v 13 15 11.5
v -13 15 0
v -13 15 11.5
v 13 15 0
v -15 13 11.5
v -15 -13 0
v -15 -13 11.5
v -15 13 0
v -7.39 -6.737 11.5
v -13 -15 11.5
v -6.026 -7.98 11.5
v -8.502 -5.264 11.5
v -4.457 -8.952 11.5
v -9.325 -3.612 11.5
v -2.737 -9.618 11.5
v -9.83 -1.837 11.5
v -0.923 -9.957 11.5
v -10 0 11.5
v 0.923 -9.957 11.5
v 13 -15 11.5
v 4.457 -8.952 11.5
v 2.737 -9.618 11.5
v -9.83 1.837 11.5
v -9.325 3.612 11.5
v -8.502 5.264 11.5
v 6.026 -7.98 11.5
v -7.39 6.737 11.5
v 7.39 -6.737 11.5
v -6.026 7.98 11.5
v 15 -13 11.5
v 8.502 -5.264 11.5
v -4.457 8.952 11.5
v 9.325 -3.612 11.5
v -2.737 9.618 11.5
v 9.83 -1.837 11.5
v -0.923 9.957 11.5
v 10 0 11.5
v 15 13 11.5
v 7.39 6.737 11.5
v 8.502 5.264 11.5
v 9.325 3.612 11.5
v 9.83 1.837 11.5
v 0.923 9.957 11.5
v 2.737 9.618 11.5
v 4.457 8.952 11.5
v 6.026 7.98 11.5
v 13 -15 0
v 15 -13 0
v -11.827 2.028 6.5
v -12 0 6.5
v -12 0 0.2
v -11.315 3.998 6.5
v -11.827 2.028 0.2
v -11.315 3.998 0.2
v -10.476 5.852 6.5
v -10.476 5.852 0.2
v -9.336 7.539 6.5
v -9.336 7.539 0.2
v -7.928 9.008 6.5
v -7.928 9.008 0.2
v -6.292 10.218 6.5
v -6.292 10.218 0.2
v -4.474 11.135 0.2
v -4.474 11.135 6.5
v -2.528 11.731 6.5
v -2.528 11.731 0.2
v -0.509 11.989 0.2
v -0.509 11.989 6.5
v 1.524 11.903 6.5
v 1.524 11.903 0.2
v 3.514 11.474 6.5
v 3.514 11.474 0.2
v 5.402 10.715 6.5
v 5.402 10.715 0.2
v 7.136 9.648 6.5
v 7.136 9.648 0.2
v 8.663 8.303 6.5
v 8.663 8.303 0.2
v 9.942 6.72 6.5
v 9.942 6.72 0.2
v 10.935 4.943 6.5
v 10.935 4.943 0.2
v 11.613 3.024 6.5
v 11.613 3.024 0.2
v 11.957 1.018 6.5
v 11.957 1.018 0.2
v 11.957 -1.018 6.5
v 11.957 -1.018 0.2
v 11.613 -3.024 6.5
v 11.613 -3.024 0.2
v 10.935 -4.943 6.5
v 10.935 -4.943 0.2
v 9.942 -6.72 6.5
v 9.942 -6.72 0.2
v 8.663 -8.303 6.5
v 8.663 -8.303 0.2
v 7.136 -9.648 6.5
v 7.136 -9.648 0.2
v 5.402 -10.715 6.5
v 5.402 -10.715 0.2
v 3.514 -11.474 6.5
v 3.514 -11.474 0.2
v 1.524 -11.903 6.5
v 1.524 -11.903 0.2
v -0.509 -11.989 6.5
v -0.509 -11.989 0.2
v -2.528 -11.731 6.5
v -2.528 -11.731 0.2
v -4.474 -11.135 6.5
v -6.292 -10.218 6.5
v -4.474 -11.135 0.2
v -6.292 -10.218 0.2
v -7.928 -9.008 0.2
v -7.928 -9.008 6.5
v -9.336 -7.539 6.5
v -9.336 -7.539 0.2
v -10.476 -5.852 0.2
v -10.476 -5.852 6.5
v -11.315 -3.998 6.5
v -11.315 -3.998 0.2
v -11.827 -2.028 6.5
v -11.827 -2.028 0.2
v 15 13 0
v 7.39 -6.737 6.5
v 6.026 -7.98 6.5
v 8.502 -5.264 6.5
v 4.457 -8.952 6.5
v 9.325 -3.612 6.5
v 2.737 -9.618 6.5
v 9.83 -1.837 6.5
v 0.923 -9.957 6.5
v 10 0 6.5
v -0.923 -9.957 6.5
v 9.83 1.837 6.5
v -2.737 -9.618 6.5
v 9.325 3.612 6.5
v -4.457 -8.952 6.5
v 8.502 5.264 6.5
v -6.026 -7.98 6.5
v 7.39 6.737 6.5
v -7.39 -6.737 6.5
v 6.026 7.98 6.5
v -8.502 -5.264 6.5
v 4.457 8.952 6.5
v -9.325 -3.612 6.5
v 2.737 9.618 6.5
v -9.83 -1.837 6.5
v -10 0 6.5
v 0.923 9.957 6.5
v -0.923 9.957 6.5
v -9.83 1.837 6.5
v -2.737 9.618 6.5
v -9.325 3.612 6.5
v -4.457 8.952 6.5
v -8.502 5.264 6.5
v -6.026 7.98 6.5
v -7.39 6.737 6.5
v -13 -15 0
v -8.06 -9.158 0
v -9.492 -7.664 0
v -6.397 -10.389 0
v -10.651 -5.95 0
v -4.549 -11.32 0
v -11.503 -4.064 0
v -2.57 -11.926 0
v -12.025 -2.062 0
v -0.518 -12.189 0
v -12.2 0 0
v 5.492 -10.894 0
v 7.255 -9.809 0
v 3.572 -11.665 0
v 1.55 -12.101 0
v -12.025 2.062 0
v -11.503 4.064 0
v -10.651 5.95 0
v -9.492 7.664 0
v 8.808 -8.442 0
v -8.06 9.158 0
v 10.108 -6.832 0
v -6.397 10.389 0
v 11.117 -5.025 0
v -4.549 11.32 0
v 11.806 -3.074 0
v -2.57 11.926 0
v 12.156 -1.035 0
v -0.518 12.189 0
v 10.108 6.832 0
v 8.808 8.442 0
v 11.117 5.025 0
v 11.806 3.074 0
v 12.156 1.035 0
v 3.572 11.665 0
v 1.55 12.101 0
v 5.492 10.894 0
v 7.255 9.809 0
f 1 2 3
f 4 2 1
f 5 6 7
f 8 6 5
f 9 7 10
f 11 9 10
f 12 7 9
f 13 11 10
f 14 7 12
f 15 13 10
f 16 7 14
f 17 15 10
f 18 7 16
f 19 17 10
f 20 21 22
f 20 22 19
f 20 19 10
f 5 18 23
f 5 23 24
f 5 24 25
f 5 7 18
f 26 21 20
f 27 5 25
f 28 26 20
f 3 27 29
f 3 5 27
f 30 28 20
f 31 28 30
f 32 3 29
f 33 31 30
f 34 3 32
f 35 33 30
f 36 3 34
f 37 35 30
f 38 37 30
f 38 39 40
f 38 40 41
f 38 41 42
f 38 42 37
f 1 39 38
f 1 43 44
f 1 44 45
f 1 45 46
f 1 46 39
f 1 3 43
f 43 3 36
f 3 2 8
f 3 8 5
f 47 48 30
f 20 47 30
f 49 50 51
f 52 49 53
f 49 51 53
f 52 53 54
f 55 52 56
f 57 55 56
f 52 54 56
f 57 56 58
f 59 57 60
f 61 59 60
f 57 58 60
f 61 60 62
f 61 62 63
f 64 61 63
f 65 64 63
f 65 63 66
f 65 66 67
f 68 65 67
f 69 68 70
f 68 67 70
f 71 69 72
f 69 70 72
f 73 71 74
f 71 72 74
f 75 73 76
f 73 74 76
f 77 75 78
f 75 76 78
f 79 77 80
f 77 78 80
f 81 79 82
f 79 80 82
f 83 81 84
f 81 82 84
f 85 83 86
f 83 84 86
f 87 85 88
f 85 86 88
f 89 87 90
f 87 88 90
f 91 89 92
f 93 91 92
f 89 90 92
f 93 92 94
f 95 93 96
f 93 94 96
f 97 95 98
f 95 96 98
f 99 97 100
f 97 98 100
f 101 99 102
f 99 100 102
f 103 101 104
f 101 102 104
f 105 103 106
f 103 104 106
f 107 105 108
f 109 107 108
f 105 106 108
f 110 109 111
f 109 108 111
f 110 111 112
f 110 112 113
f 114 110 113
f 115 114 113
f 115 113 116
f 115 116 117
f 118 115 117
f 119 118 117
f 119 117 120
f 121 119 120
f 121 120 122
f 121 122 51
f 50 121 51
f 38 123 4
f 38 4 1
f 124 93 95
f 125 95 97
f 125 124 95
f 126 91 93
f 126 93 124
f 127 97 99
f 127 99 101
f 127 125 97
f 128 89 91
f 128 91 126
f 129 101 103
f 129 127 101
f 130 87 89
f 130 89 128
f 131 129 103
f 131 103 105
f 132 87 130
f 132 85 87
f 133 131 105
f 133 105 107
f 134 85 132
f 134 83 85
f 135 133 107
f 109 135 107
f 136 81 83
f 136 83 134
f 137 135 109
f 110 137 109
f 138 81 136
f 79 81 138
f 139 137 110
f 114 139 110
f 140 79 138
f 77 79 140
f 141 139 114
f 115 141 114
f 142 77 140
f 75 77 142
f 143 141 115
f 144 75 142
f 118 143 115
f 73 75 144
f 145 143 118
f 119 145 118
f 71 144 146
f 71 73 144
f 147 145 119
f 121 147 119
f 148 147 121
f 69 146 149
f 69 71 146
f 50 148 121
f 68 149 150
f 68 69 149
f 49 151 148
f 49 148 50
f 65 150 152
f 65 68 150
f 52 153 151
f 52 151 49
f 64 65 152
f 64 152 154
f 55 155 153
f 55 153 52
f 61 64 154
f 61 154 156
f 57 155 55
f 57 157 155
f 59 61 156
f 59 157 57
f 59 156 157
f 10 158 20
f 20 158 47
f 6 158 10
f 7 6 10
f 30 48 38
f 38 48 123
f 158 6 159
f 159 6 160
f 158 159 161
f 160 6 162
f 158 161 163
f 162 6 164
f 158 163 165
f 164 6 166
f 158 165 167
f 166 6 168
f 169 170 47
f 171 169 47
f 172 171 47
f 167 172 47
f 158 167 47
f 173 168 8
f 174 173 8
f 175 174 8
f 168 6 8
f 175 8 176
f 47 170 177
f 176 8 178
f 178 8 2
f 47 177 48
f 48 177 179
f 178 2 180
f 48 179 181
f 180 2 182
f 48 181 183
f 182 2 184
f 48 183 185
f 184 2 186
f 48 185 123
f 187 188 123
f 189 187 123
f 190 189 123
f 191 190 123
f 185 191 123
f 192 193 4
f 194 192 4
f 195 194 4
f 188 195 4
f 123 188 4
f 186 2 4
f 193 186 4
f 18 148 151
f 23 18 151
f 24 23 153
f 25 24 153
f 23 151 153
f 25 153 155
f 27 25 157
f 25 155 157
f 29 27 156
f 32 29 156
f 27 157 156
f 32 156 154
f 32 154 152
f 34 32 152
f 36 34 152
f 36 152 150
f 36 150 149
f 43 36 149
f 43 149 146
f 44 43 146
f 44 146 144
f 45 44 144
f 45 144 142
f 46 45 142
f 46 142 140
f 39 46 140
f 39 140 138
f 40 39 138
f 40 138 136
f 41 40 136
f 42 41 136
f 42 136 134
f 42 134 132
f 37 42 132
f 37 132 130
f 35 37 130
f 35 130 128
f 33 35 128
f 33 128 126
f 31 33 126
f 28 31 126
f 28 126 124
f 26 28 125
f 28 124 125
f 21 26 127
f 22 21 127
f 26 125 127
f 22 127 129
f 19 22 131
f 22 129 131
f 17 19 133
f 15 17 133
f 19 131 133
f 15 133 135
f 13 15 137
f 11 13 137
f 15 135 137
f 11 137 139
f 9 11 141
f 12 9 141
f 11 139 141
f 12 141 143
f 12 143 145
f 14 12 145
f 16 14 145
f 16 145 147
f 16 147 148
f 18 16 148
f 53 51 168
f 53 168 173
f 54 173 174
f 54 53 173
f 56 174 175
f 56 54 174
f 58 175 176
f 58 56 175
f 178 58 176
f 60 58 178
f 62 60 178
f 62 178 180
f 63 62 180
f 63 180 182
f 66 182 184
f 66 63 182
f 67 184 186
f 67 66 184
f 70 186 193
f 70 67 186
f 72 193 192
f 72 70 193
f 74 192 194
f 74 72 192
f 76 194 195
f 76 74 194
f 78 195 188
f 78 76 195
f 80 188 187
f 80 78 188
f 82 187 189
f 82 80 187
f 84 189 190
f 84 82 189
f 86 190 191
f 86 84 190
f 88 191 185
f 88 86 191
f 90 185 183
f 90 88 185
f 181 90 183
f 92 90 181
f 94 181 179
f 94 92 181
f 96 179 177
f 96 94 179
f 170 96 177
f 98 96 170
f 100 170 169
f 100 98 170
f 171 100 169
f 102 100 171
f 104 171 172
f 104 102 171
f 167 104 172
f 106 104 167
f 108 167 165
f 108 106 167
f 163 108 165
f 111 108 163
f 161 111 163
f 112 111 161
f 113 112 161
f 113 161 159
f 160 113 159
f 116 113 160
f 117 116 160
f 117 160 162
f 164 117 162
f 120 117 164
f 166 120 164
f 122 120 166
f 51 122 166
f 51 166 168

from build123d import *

# Parameters (mm, degrees)
SKETCH1_W           = 30
SKETCH1_H           = 30
BOSS_EXTRUDE1_DEPTH = 11.5
SKETCH2_R           = 12
CUT_EXTRUDE1_DEPTH  = 6.5
SKETCH3_R           = 10
CUT_EXTRUDE2_DEPTH  = 6
CHAMFER1_SIZE       = 2
CHAMFER_1_SIZE      = 0.2


with BuildPart() as part:
    # Sketch1 → Boss-Extrude1 (new body)
    with BuildSketch(Plane.XY):
        Rectangle(SKETCH1_W, SKETCH1_H)
    extrude(amount=BOSS_EXTRUDE1_DEPTH)

    # Sketch2 → Cut-Extrude1 (cut)
    with BuildSketch(Plane(origin=(0, 0, 0), x_dir=(-1, 0, 0), z_dir=(0, 0, -1))):
        Circle(SKETCH2_R)
    extrude(amount=-CUT_EXTRUDE1_DEPTH, mode=Mode.SUBTRACT)

    # Sketch3 → Cut-Extrude2 (cut, through all)
    with BuildSketch(Plane(origin=(0, 0, 6.5), x_dir=(-1, 0, 0), z_dir=(0, 0, -1))):
        Circle(SKETCH3_R)
    extrude(amount=-CUT_EXTRUDE2_DEPTH, mode=Mode.SUBTRACT)

    # Chamfer1
    chamfer1_edges = [part.edges().sort_by_distance(p)[0] for p in [
        (-15, -15, 5.75),
        (-15, 15, 5.75),
        (15, 15, 5.75),
        (15, -15, 5.75),
    ]]
    chamfer(chamfer1_edges, length=CHAMFER1_SIZE)

    # 倒角1
    chamfer_1_edges = [part.edges().sort_by_distance(p)[0] for p in [
        (12, 0, 0),
    ]]
    chamfer(chamfer_1_edges, length=CHAMFER_1_SIZE)


solid = part.part
